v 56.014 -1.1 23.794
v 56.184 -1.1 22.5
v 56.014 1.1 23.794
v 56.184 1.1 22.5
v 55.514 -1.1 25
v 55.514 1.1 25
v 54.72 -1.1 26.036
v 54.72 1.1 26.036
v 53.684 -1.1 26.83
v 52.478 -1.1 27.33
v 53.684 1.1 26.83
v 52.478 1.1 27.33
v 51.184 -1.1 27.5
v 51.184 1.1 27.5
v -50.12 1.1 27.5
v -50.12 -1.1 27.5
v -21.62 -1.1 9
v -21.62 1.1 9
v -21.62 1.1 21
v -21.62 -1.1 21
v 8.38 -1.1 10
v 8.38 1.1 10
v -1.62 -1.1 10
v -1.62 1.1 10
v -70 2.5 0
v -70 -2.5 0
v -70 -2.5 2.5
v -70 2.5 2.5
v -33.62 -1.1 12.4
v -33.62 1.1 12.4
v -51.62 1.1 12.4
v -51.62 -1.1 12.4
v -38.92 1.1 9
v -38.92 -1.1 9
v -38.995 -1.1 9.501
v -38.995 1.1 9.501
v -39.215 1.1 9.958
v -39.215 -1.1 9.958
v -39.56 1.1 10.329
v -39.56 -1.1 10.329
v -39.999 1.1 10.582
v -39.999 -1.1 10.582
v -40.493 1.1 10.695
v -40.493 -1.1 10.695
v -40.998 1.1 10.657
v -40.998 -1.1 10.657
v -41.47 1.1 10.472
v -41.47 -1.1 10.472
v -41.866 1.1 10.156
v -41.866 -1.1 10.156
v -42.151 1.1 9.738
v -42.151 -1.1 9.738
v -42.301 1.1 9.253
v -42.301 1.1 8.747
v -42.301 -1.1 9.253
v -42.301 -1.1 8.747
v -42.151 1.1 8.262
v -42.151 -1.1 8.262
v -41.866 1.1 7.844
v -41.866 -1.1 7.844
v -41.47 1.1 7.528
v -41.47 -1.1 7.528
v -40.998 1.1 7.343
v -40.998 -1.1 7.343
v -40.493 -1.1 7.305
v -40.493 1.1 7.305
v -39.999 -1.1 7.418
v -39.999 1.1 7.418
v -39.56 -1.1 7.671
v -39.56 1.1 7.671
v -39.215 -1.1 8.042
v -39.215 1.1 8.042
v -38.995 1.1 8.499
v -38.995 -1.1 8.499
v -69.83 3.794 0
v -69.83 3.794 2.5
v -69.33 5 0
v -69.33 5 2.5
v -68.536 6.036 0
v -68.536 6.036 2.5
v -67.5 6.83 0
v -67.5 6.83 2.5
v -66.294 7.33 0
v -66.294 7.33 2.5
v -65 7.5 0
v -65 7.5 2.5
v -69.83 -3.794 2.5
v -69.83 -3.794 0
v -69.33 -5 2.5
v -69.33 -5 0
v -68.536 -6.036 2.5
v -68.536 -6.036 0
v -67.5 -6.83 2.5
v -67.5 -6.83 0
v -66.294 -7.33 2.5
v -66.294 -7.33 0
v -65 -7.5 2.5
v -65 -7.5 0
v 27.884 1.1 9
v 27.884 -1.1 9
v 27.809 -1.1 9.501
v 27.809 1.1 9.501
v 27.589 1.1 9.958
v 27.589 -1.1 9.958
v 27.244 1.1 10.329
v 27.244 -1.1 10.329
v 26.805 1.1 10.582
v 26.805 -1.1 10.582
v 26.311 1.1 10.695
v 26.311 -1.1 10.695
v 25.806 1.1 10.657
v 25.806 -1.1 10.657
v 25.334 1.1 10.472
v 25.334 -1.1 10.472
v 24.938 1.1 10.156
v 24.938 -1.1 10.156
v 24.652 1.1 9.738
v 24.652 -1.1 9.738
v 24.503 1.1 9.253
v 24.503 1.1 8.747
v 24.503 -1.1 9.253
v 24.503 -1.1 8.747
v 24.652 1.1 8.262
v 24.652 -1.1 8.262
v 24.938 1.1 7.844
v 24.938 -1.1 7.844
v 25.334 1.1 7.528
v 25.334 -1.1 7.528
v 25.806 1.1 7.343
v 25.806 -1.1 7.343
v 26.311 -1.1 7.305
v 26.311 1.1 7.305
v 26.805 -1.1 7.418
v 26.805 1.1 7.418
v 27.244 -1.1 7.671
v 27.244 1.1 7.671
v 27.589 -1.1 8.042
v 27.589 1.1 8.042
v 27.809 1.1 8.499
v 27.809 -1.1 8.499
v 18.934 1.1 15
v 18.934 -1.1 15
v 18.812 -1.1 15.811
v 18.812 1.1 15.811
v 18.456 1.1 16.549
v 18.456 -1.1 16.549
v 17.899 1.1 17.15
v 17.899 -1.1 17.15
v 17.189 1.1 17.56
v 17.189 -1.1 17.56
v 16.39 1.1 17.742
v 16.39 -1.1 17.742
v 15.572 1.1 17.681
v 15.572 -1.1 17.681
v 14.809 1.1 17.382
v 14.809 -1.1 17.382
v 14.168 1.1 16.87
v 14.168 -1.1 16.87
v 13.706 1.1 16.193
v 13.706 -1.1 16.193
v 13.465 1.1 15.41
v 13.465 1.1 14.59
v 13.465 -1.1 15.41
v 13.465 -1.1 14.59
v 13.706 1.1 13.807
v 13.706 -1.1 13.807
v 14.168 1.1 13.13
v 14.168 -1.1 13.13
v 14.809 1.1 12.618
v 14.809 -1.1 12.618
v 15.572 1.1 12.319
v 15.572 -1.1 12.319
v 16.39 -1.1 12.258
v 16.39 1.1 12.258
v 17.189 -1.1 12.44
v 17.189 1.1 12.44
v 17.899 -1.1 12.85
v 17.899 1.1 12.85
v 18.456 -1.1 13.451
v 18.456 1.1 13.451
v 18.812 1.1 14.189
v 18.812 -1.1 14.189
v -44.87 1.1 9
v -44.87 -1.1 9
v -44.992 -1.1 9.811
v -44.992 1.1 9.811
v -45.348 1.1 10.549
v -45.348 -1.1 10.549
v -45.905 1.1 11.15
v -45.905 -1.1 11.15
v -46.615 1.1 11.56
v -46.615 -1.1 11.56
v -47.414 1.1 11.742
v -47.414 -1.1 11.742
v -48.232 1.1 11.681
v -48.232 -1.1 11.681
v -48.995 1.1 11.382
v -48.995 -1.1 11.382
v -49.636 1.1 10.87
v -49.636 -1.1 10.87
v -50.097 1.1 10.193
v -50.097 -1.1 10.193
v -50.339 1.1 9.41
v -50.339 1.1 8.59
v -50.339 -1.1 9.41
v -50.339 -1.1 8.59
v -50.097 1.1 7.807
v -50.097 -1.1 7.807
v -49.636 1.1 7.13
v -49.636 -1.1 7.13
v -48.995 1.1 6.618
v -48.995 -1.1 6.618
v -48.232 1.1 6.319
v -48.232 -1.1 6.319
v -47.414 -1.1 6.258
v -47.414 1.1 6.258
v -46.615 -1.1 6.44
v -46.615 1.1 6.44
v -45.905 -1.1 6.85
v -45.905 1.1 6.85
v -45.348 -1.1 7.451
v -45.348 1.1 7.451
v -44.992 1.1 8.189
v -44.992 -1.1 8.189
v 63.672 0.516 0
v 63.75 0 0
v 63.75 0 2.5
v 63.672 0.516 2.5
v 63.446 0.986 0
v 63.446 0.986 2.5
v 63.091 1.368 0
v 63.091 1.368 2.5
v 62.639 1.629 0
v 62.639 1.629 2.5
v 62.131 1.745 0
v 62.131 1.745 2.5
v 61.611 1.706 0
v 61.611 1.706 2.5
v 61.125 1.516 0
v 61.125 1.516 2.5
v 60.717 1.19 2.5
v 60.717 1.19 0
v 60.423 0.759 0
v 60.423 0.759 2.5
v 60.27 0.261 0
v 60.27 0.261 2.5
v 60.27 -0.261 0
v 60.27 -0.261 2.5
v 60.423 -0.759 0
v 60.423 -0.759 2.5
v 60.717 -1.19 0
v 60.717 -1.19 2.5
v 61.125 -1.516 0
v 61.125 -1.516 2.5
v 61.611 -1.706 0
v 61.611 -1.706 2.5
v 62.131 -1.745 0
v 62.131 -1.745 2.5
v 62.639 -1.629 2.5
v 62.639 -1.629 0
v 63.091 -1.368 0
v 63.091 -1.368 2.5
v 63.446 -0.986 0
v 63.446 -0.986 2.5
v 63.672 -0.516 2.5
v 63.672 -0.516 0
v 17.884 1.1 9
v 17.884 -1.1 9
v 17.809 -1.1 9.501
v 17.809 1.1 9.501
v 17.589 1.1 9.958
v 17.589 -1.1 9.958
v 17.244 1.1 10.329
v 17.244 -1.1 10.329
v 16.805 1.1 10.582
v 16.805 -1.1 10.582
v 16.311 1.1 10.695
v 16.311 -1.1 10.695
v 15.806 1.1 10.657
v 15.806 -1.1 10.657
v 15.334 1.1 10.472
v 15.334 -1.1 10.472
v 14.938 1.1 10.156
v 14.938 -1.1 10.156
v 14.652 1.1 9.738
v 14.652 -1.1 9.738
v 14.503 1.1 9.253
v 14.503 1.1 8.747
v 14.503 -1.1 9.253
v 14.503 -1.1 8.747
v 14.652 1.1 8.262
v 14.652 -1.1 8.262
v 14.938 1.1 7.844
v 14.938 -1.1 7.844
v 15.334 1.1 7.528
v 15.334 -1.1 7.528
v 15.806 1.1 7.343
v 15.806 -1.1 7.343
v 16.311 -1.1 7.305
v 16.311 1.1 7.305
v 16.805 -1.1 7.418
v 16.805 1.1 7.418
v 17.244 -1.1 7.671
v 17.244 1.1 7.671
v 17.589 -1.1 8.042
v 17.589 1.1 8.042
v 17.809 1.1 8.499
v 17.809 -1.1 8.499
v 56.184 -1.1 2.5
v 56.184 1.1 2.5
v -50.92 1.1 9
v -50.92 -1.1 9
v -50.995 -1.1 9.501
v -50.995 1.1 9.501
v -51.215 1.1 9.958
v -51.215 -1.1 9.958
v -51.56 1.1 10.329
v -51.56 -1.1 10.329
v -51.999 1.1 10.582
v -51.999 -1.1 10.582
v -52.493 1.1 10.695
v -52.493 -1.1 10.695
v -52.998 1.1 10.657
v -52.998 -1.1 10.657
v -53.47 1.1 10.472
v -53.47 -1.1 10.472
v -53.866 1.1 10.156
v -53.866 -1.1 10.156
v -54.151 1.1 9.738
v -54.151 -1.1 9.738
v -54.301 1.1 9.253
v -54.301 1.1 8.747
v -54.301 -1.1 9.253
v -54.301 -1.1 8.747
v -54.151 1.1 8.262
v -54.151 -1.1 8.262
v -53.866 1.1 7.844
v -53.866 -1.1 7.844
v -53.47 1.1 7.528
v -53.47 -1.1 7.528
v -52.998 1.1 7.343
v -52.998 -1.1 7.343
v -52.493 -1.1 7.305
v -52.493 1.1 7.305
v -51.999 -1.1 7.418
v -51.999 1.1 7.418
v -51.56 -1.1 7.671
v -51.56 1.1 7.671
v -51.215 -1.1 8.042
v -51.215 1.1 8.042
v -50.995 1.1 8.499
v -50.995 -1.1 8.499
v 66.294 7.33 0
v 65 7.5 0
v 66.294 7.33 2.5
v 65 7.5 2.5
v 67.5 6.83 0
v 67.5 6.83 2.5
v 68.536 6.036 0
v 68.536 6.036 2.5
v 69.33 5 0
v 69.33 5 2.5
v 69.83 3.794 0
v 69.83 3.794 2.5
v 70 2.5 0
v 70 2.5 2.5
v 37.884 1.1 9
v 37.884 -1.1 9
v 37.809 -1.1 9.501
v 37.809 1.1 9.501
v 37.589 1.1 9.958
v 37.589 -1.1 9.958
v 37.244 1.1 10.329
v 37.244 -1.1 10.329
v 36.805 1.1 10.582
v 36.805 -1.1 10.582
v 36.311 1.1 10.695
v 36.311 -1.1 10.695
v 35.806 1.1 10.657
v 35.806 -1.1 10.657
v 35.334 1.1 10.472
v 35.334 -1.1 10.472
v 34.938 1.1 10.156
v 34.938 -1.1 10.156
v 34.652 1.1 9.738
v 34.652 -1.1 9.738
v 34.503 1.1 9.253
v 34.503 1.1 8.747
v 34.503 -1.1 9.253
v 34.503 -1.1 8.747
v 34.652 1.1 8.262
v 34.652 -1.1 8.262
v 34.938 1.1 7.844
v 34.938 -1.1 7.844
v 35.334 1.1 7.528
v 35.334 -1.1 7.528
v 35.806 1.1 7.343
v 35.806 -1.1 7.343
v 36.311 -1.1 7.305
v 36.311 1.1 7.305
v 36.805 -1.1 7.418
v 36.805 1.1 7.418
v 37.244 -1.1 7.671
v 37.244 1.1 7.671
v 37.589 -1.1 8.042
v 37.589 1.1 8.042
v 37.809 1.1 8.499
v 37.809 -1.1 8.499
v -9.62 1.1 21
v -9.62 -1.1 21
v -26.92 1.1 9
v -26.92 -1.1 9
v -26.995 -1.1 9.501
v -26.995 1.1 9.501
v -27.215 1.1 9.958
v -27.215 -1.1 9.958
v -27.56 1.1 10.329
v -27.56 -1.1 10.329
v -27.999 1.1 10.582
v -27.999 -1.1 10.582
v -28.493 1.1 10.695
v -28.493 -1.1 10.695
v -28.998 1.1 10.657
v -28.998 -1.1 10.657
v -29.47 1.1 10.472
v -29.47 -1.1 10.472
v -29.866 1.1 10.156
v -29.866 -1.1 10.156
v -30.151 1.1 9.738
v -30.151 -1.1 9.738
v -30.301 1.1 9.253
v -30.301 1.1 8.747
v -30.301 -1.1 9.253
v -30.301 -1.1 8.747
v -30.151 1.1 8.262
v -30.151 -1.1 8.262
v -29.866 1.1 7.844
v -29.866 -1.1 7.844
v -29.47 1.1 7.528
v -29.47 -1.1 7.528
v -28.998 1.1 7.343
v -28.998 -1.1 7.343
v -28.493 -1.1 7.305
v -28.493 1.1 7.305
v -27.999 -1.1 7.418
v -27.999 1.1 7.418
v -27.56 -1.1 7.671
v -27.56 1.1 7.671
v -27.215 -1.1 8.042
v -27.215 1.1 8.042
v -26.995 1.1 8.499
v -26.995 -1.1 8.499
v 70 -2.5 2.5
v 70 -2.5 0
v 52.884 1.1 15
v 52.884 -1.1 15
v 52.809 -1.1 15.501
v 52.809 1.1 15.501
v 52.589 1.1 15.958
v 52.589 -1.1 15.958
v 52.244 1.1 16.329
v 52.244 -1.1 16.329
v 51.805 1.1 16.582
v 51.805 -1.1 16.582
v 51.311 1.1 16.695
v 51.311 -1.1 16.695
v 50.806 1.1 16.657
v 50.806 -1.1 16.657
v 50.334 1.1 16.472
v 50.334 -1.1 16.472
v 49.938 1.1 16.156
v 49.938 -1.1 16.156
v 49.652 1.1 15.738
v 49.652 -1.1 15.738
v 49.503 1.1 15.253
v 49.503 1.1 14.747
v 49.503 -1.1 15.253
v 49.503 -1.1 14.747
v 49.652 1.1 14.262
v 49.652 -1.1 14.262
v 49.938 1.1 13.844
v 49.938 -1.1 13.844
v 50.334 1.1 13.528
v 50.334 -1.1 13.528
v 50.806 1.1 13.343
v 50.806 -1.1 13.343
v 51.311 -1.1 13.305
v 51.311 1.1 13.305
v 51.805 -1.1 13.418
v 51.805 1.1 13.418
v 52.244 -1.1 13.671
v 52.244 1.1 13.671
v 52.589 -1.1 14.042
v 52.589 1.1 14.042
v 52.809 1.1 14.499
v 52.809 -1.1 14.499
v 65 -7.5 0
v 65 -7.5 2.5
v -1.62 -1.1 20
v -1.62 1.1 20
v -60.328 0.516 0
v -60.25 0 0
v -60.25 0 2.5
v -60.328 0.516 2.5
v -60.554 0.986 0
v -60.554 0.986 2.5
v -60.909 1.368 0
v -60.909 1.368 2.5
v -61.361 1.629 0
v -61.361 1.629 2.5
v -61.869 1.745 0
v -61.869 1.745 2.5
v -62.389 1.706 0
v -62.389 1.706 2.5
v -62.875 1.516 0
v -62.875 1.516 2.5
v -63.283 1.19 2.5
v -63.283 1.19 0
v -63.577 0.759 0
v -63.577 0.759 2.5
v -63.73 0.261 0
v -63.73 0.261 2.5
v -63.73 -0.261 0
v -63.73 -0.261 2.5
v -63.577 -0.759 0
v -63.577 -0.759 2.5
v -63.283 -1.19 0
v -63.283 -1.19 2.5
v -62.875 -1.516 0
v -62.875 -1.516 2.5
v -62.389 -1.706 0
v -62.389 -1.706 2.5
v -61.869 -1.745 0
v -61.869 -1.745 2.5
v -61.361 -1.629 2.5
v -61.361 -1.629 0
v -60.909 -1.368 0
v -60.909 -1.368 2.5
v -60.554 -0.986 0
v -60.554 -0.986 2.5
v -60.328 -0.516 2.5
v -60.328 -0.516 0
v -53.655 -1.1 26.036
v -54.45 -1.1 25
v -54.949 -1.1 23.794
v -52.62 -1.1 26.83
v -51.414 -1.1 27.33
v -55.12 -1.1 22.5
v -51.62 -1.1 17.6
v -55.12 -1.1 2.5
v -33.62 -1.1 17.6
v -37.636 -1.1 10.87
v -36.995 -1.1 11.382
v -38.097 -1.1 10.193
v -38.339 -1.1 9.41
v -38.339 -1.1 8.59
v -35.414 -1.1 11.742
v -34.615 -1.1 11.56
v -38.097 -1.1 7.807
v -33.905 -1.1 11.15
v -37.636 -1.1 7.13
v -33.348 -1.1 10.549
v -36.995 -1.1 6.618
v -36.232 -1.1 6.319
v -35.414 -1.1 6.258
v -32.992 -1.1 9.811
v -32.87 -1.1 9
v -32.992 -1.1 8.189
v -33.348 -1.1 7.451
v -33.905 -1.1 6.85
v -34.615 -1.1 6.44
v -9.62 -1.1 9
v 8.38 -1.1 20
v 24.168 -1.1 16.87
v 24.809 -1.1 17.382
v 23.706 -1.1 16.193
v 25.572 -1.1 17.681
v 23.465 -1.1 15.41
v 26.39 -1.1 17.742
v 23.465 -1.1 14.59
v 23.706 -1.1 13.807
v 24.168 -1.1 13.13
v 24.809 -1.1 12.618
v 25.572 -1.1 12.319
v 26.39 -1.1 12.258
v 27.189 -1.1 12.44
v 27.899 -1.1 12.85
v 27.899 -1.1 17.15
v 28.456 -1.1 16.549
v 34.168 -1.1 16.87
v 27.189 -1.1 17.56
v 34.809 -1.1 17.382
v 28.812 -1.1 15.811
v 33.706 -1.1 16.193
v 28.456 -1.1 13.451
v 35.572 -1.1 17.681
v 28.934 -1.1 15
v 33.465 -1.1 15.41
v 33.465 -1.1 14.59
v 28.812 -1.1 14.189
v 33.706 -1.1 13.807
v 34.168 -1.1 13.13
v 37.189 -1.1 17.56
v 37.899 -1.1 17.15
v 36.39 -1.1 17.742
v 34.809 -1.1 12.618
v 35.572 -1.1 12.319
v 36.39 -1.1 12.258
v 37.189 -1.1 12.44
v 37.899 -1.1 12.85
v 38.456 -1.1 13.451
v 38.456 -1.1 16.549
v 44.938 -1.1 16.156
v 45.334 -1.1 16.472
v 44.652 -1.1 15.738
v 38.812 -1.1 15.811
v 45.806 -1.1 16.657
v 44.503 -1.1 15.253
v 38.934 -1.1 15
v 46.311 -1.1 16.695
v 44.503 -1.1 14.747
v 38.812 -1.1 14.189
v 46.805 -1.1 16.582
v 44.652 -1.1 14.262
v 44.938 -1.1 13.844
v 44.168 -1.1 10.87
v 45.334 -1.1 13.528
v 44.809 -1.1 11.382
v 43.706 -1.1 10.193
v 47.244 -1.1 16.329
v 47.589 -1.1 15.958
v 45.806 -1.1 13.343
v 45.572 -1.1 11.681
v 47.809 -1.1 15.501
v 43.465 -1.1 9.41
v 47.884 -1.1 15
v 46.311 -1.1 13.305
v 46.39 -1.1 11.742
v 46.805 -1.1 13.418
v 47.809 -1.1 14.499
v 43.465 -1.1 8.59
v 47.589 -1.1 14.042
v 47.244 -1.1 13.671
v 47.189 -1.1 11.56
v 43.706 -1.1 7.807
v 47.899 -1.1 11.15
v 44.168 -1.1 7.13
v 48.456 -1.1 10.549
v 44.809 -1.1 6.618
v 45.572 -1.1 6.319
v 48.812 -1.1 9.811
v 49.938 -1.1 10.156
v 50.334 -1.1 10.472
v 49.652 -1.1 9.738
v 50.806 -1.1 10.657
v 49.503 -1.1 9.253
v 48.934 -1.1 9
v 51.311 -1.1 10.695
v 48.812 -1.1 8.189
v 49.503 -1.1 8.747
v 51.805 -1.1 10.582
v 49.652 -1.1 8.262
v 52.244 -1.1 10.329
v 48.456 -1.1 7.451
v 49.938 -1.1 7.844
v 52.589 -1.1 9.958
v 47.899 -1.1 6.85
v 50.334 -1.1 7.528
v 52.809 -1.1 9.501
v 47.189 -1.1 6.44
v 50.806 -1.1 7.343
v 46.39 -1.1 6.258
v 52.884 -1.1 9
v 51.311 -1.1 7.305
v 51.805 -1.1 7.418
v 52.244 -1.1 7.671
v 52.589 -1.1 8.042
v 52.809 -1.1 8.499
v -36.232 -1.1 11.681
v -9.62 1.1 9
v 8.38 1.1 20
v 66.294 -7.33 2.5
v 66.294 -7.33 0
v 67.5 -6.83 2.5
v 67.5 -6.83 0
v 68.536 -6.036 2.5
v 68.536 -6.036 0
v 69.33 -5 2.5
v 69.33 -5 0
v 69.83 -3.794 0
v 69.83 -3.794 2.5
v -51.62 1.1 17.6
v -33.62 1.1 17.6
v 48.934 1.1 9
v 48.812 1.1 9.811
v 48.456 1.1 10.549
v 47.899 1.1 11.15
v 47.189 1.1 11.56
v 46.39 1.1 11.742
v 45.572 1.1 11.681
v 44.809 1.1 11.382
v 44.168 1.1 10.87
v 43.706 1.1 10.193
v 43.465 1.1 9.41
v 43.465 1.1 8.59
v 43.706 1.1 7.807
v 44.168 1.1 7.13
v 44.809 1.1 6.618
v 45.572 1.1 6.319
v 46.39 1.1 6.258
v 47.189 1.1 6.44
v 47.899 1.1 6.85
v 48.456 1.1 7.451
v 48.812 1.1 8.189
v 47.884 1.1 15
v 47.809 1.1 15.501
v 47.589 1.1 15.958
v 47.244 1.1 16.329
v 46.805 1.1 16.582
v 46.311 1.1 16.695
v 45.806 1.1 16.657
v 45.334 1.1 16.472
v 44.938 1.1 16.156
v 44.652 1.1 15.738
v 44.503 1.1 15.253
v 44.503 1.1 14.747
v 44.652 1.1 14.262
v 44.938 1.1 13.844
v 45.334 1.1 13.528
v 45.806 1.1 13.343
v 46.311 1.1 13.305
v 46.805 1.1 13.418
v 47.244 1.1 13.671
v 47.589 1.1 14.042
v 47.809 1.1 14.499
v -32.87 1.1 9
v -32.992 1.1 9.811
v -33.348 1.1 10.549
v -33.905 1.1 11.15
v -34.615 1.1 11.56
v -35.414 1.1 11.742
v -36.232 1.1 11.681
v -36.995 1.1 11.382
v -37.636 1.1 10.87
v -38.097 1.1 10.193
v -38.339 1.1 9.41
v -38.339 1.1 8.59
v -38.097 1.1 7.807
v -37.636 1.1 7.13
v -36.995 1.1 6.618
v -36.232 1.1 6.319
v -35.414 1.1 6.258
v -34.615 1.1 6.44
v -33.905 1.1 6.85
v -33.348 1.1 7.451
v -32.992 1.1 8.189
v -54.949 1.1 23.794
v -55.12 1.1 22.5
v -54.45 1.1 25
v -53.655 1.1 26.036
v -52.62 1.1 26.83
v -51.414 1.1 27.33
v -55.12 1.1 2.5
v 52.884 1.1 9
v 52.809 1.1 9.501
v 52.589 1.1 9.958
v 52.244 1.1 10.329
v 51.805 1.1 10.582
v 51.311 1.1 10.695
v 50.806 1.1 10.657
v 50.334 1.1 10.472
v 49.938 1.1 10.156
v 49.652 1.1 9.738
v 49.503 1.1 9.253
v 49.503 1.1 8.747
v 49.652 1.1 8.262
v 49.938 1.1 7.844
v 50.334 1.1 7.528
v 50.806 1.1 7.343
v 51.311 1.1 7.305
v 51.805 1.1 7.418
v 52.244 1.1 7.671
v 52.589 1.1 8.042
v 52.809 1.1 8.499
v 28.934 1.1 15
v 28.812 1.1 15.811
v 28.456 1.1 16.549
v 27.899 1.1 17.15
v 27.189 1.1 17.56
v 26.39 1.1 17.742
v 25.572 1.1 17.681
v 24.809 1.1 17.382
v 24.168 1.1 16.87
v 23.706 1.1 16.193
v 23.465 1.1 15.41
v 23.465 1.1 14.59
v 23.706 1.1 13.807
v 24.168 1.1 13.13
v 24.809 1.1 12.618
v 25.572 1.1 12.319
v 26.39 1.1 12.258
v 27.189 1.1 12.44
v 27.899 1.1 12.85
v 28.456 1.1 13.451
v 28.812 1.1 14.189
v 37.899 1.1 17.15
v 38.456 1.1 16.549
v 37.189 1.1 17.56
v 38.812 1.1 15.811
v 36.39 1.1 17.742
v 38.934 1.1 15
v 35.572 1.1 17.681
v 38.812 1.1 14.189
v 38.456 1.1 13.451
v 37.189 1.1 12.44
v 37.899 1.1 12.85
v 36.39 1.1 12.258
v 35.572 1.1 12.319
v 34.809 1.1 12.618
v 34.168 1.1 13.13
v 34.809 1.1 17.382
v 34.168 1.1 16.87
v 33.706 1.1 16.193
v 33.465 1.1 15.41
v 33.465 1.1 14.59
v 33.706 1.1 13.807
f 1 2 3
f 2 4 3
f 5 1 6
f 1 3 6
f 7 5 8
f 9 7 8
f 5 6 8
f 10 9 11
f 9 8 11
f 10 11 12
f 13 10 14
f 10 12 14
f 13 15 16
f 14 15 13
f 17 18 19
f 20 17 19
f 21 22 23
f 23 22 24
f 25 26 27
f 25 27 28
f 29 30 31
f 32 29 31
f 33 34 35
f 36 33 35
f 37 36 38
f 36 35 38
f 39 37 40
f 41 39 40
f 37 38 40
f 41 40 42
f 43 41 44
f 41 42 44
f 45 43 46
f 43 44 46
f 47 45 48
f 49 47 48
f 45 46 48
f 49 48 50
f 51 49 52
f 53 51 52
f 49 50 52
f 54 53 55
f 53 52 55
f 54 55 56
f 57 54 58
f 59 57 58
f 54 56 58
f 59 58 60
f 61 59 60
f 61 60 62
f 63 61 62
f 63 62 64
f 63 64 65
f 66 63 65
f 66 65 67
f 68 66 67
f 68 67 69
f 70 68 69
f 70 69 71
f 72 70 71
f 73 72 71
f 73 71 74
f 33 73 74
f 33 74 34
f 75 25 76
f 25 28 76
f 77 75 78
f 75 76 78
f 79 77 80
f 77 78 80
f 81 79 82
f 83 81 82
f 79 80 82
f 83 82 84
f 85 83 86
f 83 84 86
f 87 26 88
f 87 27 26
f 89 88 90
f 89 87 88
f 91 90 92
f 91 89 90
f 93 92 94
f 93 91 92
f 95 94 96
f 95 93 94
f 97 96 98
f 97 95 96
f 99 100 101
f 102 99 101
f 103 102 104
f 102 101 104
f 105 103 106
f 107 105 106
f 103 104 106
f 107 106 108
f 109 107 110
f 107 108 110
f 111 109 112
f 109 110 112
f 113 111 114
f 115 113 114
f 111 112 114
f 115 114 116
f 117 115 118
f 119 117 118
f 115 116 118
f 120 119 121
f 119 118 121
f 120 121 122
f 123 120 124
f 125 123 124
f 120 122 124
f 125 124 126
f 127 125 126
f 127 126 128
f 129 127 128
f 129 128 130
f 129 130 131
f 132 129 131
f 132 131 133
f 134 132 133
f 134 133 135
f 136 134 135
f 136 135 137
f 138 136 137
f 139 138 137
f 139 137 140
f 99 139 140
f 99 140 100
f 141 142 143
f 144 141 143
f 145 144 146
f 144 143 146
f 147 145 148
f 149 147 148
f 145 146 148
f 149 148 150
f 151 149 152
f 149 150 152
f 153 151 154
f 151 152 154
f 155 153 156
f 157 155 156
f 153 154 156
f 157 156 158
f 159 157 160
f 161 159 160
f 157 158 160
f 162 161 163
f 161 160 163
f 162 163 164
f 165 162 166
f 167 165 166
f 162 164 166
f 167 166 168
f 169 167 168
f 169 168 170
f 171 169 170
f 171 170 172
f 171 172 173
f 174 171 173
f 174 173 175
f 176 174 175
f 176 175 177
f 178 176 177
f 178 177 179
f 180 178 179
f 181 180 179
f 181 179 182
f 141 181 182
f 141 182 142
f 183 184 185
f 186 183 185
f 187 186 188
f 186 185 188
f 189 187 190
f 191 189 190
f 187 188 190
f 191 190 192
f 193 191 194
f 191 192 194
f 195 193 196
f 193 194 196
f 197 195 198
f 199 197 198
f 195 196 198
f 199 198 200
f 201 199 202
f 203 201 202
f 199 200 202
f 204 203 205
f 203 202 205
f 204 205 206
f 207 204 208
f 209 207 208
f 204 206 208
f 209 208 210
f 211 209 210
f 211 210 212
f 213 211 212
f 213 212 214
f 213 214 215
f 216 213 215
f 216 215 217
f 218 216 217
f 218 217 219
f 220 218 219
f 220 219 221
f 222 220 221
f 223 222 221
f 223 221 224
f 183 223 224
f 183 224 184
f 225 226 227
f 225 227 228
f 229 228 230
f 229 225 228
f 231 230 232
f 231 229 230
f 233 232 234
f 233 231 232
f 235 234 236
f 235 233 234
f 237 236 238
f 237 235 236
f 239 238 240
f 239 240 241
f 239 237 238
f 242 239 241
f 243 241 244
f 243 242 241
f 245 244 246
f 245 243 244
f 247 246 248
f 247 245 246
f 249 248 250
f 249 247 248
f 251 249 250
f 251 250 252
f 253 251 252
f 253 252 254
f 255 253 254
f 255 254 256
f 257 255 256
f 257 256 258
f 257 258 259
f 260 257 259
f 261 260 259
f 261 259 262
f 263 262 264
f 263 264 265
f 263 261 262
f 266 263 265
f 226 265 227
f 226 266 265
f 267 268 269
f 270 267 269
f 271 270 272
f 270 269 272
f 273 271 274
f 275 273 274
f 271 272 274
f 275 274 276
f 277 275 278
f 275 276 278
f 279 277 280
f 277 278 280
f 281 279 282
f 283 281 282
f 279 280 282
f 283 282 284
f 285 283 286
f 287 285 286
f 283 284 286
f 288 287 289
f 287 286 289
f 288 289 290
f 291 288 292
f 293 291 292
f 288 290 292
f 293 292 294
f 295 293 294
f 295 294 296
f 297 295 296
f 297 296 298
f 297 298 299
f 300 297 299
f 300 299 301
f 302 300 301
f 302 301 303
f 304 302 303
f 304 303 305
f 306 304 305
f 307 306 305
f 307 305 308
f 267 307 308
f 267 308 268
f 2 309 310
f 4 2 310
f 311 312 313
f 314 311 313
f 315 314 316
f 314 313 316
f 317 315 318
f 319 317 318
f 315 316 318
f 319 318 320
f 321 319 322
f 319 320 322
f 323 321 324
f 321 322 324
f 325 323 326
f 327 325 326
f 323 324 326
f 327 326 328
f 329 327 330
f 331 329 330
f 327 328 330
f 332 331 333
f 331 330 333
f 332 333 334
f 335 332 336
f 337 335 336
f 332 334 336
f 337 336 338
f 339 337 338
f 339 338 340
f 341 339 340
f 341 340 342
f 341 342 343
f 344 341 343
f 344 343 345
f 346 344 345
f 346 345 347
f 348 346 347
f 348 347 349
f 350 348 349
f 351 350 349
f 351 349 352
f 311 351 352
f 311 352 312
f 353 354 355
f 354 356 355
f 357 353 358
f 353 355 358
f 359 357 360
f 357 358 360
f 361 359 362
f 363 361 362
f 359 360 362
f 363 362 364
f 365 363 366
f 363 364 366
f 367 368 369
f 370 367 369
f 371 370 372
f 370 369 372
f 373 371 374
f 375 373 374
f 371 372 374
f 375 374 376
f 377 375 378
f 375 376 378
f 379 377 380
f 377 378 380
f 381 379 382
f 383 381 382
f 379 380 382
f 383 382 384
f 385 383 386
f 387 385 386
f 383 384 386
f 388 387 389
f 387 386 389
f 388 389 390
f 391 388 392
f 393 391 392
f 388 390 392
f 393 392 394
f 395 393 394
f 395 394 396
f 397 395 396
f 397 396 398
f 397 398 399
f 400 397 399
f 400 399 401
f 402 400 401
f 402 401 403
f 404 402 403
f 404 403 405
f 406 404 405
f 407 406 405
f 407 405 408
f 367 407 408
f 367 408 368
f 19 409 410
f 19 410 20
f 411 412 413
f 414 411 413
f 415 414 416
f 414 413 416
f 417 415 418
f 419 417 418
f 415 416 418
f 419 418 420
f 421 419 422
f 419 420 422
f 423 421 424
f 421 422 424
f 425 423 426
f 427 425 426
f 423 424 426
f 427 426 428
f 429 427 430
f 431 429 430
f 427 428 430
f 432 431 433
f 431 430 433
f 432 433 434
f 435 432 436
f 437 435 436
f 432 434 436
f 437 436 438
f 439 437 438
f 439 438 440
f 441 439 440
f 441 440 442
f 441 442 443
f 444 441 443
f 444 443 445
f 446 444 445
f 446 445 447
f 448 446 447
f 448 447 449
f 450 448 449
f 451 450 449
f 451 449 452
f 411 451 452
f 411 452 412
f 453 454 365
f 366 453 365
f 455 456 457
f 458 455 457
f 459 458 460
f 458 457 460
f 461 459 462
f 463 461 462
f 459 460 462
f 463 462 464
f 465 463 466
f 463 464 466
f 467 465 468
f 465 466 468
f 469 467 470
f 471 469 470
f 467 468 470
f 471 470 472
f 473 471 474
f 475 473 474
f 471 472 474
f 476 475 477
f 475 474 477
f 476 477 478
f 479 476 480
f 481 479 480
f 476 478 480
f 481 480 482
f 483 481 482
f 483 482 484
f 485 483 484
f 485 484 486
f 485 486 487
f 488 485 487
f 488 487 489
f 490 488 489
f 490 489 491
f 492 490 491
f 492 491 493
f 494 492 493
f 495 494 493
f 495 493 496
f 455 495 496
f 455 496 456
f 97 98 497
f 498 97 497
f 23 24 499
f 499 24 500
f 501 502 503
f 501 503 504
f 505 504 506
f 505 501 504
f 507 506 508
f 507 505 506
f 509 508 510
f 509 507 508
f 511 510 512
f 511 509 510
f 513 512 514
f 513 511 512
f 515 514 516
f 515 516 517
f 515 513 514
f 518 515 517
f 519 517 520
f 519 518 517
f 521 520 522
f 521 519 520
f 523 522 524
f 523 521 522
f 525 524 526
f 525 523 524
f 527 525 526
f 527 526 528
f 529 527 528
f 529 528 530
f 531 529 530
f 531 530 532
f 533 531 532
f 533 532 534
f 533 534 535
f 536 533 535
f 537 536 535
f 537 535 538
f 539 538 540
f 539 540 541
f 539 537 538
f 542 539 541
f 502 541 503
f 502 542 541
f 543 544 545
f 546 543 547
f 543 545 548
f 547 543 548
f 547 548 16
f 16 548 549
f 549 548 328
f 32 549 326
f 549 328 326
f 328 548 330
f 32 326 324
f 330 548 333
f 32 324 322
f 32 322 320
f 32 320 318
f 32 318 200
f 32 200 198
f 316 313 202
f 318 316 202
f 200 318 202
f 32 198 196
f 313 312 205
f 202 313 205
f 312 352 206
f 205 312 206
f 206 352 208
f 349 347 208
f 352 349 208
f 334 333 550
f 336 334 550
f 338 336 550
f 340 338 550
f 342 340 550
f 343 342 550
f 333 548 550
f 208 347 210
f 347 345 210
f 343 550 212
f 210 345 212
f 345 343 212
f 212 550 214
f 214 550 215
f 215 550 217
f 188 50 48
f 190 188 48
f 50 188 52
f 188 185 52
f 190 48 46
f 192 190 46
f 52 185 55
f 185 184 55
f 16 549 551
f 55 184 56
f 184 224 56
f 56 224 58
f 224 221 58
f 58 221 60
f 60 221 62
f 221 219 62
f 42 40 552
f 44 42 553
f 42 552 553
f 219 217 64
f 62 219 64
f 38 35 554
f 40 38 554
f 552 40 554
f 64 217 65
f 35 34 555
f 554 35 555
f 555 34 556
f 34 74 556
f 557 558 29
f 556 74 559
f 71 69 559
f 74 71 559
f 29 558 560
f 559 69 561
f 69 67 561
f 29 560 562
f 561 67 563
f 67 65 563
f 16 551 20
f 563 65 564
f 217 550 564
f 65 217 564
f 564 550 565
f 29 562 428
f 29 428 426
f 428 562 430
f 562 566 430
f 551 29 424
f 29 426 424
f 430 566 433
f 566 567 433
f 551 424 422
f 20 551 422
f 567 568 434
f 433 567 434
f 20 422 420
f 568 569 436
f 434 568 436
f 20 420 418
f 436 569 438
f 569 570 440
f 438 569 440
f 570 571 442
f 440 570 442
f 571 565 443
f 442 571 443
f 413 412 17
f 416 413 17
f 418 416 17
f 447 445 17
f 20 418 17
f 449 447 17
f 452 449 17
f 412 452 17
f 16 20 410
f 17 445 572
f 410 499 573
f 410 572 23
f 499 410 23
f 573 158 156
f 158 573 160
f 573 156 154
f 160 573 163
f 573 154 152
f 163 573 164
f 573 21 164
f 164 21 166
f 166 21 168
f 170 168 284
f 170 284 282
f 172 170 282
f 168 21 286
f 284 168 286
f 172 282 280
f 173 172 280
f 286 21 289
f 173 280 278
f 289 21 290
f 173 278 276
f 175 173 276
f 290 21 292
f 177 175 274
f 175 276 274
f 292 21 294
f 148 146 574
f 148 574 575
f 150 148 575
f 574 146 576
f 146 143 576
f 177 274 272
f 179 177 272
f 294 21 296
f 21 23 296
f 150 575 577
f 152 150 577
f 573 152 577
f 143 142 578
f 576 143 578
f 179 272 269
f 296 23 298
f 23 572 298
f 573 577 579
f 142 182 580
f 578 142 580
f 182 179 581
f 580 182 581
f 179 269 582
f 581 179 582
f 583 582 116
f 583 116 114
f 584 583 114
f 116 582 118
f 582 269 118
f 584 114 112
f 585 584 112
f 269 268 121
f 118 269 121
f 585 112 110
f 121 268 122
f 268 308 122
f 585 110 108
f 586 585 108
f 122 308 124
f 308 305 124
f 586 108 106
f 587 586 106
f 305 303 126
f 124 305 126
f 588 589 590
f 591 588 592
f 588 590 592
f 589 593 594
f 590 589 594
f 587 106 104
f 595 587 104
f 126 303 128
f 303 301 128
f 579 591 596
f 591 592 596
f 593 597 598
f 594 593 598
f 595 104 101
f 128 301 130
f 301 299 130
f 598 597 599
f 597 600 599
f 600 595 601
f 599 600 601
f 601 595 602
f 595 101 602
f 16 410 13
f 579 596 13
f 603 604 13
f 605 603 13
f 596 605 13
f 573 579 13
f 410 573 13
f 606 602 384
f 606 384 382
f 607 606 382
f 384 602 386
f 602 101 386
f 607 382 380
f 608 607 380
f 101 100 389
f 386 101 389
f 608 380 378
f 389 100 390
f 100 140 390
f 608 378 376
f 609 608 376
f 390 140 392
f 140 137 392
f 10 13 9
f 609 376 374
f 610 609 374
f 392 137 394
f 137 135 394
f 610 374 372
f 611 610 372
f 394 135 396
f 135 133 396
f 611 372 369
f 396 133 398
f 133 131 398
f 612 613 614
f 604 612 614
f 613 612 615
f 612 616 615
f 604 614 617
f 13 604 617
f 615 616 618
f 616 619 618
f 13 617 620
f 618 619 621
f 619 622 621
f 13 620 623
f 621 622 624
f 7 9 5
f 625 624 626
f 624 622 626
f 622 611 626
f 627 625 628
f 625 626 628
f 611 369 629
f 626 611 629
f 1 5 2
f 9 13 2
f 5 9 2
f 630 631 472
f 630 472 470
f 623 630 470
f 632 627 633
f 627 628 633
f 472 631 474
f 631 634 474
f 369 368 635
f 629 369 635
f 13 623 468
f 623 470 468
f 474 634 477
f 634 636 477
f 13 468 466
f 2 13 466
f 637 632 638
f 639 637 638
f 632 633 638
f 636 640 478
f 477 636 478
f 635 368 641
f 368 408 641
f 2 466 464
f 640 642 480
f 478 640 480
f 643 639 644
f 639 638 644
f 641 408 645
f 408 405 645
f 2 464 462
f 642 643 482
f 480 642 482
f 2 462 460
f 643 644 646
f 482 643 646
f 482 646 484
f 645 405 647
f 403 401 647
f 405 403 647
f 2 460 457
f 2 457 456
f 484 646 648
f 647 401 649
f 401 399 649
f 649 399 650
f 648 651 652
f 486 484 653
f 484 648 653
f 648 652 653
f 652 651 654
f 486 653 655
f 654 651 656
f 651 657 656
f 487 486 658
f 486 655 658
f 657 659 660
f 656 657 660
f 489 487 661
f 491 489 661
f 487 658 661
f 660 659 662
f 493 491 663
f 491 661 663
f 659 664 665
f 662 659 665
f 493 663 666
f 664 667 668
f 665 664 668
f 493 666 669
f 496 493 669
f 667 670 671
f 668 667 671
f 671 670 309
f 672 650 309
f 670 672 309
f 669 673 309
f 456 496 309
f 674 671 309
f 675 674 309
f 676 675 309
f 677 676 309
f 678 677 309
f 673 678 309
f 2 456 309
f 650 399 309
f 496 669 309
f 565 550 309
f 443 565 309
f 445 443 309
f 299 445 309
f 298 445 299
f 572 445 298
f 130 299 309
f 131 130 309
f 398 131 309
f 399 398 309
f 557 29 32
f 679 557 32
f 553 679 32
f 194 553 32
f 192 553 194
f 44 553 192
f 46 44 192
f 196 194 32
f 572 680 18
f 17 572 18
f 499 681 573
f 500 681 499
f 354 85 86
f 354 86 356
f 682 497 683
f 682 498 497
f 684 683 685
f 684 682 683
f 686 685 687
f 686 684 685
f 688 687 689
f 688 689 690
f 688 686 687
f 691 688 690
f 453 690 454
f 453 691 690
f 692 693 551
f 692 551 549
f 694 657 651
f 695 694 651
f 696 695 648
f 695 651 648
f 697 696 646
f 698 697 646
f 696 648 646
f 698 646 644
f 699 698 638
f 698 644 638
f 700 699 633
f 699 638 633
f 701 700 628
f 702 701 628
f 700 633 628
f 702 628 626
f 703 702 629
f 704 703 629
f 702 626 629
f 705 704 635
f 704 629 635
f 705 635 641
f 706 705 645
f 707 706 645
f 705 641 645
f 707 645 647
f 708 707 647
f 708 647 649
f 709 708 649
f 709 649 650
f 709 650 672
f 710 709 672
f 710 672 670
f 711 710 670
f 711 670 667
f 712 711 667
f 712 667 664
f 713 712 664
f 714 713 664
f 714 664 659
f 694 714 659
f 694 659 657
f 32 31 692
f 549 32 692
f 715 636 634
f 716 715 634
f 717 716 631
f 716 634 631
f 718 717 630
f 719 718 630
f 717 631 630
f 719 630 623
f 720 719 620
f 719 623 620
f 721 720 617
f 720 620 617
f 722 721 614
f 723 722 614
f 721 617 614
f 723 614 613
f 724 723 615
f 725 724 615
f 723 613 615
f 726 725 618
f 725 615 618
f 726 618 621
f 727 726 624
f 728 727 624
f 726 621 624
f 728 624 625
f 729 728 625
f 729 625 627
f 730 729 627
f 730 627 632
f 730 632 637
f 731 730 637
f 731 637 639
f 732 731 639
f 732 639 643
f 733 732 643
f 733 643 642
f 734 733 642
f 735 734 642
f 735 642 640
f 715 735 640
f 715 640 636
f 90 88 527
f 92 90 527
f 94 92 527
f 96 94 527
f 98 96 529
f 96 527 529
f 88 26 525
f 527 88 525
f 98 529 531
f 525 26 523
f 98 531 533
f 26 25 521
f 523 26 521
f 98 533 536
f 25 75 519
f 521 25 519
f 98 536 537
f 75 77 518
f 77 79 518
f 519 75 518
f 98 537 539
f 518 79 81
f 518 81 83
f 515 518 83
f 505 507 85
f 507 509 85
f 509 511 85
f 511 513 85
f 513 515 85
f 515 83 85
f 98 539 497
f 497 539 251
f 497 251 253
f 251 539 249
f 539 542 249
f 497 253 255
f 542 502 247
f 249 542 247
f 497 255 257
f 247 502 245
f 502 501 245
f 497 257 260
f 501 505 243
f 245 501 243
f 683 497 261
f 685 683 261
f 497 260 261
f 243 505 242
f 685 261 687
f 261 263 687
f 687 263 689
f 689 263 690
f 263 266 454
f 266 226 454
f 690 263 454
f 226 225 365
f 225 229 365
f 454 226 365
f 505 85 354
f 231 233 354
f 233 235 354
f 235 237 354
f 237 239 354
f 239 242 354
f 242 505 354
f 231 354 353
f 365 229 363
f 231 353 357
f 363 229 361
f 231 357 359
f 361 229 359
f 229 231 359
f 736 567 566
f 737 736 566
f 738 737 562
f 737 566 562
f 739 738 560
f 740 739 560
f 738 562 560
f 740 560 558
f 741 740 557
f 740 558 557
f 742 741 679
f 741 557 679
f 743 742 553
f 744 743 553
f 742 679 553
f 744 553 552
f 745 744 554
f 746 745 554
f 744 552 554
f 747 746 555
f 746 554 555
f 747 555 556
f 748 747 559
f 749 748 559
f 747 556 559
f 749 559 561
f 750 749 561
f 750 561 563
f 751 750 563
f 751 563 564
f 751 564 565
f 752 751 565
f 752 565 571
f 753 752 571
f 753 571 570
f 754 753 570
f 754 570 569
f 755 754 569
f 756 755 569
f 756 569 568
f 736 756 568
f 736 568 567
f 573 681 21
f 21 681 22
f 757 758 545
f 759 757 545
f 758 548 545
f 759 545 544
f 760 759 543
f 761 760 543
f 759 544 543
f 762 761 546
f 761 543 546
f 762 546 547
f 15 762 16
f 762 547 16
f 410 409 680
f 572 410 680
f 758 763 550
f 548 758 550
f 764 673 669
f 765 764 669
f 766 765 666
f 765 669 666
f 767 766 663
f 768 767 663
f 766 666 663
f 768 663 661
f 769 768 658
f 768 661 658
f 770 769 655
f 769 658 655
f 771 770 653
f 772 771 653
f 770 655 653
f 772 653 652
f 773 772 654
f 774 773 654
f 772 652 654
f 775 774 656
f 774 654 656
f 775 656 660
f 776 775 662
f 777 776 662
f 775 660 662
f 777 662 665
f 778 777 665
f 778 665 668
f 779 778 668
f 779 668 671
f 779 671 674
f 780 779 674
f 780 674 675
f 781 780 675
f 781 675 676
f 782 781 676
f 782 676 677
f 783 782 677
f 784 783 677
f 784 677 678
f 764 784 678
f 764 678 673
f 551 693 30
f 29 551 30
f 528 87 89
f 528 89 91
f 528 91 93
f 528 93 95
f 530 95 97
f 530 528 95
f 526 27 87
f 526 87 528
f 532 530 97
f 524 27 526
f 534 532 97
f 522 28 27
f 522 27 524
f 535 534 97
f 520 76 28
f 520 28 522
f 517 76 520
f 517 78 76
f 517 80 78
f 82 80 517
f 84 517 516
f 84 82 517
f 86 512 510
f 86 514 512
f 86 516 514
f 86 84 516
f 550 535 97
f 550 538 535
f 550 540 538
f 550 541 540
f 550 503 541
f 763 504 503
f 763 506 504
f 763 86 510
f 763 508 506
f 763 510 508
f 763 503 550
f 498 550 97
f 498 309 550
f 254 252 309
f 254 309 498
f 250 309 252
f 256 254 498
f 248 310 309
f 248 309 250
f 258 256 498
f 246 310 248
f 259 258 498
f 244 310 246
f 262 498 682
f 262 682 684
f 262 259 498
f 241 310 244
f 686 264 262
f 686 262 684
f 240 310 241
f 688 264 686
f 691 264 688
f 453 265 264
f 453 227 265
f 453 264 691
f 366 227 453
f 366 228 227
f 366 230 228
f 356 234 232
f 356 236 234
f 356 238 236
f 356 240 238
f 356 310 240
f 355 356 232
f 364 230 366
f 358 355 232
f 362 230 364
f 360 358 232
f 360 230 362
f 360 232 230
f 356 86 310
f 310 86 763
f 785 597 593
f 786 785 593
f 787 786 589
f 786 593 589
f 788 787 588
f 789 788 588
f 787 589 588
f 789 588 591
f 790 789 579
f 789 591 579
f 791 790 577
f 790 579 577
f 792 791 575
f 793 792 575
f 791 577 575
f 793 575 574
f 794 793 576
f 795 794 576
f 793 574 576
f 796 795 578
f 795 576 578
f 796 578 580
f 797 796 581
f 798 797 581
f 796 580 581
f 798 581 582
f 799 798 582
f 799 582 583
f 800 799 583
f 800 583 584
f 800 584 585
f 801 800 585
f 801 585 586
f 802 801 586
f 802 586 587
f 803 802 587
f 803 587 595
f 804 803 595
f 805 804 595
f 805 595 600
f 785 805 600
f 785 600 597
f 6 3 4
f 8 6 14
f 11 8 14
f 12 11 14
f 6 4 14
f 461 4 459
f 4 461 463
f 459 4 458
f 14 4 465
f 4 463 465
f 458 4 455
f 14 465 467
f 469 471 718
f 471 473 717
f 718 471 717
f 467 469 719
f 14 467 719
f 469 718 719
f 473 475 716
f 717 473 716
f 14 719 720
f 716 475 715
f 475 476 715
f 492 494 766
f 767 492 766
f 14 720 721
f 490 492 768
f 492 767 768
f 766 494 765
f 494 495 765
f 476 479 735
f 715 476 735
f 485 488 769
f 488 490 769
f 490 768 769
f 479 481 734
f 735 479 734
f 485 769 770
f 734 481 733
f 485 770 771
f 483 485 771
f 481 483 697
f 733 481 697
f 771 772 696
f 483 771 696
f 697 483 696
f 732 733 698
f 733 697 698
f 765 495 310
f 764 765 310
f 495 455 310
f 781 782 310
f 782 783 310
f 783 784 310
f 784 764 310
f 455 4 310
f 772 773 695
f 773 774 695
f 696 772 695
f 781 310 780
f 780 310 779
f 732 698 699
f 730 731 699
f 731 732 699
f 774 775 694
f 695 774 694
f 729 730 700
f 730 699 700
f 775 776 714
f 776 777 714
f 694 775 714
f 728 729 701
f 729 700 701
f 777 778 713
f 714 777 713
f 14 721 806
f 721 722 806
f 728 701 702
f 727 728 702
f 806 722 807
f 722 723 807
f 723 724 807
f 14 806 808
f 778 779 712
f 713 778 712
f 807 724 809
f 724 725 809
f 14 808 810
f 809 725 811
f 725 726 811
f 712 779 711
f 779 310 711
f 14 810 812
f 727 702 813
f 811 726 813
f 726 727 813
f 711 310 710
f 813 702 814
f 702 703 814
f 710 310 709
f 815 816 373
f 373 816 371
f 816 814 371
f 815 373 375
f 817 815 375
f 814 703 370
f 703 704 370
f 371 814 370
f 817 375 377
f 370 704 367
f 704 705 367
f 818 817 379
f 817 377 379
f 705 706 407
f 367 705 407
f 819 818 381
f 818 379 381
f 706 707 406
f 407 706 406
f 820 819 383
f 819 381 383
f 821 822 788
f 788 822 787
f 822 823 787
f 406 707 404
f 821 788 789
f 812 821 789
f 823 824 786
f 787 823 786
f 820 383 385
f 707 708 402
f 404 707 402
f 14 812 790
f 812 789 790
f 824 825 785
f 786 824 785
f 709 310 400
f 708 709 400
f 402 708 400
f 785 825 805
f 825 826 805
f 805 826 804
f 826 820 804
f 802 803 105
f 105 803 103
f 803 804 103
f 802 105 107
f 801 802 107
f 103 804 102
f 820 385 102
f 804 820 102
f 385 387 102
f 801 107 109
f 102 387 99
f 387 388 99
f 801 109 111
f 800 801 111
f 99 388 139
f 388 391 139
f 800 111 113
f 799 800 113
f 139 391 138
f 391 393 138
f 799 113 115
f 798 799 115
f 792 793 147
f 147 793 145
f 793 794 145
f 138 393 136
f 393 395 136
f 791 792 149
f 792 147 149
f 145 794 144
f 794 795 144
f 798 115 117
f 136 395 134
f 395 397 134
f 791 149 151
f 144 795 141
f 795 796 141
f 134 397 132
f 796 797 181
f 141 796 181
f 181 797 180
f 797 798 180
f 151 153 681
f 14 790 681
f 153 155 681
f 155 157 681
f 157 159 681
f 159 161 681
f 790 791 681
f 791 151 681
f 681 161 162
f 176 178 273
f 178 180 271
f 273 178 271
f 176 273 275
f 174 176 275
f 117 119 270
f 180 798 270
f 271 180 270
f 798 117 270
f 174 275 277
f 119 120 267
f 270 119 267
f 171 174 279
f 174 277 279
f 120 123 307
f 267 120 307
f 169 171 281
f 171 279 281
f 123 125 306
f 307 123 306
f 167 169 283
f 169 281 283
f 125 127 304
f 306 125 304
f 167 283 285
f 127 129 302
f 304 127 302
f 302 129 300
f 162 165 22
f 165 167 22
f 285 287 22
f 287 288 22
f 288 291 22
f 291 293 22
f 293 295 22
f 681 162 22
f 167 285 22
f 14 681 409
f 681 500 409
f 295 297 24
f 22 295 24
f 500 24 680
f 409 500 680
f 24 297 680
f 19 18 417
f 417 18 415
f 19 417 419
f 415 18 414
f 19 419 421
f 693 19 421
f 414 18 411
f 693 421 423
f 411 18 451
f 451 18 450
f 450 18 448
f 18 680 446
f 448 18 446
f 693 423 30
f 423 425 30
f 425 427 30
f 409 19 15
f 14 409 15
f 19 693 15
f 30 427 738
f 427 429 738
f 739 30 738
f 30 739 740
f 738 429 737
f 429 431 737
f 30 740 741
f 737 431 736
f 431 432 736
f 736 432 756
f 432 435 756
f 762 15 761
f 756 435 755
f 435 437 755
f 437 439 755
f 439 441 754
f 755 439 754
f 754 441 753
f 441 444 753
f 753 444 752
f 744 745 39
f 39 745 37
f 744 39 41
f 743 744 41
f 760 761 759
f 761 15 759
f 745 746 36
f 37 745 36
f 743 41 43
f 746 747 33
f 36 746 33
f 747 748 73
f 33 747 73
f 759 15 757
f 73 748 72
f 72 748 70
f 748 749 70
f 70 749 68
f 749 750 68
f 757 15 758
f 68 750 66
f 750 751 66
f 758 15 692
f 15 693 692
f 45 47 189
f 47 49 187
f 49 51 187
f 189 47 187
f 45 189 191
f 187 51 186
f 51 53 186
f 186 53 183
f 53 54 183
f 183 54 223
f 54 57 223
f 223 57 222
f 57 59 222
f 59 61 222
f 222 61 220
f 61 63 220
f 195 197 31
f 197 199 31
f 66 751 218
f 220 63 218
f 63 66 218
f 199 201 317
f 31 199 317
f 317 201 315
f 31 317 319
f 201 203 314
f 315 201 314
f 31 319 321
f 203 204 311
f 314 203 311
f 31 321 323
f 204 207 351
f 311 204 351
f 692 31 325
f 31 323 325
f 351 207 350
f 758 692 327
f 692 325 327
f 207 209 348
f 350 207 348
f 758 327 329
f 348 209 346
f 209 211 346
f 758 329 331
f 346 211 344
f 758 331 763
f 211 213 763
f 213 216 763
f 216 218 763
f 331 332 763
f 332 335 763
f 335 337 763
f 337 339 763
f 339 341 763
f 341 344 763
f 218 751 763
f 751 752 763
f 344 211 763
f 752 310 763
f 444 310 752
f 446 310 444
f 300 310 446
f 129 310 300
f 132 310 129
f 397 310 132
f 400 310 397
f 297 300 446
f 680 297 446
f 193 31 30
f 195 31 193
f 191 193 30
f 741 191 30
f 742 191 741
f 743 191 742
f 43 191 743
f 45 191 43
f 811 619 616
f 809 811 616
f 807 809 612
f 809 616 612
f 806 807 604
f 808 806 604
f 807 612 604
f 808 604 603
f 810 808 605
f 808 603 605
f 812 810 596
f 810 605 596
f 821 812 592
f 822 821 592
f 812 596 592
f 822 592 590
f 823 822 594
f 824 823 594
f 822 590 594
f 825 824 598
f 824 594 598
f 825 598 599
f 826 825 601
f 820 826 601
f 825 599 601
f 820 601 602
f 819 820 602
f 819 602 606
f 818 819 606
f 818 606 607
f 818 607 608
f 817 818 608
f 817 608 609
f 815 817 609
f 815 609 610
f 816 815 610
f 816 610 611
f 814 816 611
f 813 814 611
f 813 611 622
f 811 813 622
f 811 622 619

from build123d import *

# Parameters (mm, degrees)
F0_W     = 140
F0_H     = 15
F0_R     = 1.75
F1_DEPTH = 2.5
F3_DEPTH = 25
F4_W     = 18
F4_H     = 2.6
F4_W_2   = 12
F4_H_2   = 6
F4_W_3   = 10
F4_H_3   = 5
F5_DEPTH = 25
F6_D     = 3.4
F7_D     = 5.5
F8_R     = 5


with BuildPart() as f1:
    # F0 (on Top) → F1 (new body)
    with BuildSketch(Plane.XY):
        Rectangle(F0_W, F0_H)
        with Locations((-62, 0)):
            Circle(F0_R, mode=Mode.SUBTRACT)
        with Locations((62, 0)):
            Circle(F0_R, mode=Mode.SUBTRACT)
    extrude(amount=F1_DEPTH)

    # F2 (on face) → F3 (join)
    with BuildSketch(Plane.XY.offset(2.5)):
        Polygon((56.1840869486, 1.1), (-55.1196709275, 1.1), (-55.1196709275, -1.1), (56.1840869486, -1.1), (56.1840869486, 0), align=None)
    extrude(amount=F3_DEPTH)

    # F4 (on face) → F5 (cut)
    with BuildSketch(Plane(origin=(0, 1.1, 0), x_dir=(-1, 0, 0), z_dir=(0, 1, 0))):
        with Locations((42.6196709275, 16.3)):
            Rectangle(F4_W, F4_H)
        with Locations((42.6196709275, 13.7)):
            Rectangle(F4_W, F4_H)
        with Locations((15.6196709275, 18)):
            Rectangle(F4_W_2, F4_H_2)
        with Locations((15.6196709275, 12)):
            Rectangle(F4_W_2, F4_H_2)
        with Locations((-3.3803290725, 17.5)):
            Rectangle(F4_W_3, F4_H_3)
        with Locations((-3.3803290725, 12.5)):
            Rectangle(F4_W_3, F4_H_3)
    extrude(amount=-F5_DEPTH, mode=Mode.SUBTRACT)

    # F6 (through all)
    with Locations(Plane(origin=(0, 1.1, 0), x_dir=(-1, 0, 0), z_dir=(0, 1, 0))):
        with Locations((-51.1840869486, 15), (-46.1840869486, 15), (-16.1840869486, 9), (-26.1840869486, 9), (-36.1840869486, 9), (-51.1840869486, 9), (52.6196709275, 9), (40.6196709275, 9), (28.6196709275, 9)):
            Hole(F6_D / 2)

    # F7 (through all)
    with Locations(Plane(origin=(0, 1.1, 0), x_dir=(-1, 0, 0), z_dir=(0, 1, 0))):
        with Locations((-36.1840869486, 15), (-26.1840869486, 15), (-16.1840869486, 15), (-46.1840869486, 9), (47.6196709275, 9), (35.6196709275, 9)):
            Hole(F7_D / 2)

    # F8
    f8_edges = [f1.edges().sort_by_distance(p)[0] for p in [
        (56.184087, 0, 27.5),
        (-55.119671, 0, 27.5),
        (70, 7.5, 1.25),
        (70, -7.5, 1.25),
        (-70, 7.5, 1.25),
        (-70, -7.5, 1.25),
    ]]
    fillet(f8_edges, radius=F8_R)


solid = f1.part
